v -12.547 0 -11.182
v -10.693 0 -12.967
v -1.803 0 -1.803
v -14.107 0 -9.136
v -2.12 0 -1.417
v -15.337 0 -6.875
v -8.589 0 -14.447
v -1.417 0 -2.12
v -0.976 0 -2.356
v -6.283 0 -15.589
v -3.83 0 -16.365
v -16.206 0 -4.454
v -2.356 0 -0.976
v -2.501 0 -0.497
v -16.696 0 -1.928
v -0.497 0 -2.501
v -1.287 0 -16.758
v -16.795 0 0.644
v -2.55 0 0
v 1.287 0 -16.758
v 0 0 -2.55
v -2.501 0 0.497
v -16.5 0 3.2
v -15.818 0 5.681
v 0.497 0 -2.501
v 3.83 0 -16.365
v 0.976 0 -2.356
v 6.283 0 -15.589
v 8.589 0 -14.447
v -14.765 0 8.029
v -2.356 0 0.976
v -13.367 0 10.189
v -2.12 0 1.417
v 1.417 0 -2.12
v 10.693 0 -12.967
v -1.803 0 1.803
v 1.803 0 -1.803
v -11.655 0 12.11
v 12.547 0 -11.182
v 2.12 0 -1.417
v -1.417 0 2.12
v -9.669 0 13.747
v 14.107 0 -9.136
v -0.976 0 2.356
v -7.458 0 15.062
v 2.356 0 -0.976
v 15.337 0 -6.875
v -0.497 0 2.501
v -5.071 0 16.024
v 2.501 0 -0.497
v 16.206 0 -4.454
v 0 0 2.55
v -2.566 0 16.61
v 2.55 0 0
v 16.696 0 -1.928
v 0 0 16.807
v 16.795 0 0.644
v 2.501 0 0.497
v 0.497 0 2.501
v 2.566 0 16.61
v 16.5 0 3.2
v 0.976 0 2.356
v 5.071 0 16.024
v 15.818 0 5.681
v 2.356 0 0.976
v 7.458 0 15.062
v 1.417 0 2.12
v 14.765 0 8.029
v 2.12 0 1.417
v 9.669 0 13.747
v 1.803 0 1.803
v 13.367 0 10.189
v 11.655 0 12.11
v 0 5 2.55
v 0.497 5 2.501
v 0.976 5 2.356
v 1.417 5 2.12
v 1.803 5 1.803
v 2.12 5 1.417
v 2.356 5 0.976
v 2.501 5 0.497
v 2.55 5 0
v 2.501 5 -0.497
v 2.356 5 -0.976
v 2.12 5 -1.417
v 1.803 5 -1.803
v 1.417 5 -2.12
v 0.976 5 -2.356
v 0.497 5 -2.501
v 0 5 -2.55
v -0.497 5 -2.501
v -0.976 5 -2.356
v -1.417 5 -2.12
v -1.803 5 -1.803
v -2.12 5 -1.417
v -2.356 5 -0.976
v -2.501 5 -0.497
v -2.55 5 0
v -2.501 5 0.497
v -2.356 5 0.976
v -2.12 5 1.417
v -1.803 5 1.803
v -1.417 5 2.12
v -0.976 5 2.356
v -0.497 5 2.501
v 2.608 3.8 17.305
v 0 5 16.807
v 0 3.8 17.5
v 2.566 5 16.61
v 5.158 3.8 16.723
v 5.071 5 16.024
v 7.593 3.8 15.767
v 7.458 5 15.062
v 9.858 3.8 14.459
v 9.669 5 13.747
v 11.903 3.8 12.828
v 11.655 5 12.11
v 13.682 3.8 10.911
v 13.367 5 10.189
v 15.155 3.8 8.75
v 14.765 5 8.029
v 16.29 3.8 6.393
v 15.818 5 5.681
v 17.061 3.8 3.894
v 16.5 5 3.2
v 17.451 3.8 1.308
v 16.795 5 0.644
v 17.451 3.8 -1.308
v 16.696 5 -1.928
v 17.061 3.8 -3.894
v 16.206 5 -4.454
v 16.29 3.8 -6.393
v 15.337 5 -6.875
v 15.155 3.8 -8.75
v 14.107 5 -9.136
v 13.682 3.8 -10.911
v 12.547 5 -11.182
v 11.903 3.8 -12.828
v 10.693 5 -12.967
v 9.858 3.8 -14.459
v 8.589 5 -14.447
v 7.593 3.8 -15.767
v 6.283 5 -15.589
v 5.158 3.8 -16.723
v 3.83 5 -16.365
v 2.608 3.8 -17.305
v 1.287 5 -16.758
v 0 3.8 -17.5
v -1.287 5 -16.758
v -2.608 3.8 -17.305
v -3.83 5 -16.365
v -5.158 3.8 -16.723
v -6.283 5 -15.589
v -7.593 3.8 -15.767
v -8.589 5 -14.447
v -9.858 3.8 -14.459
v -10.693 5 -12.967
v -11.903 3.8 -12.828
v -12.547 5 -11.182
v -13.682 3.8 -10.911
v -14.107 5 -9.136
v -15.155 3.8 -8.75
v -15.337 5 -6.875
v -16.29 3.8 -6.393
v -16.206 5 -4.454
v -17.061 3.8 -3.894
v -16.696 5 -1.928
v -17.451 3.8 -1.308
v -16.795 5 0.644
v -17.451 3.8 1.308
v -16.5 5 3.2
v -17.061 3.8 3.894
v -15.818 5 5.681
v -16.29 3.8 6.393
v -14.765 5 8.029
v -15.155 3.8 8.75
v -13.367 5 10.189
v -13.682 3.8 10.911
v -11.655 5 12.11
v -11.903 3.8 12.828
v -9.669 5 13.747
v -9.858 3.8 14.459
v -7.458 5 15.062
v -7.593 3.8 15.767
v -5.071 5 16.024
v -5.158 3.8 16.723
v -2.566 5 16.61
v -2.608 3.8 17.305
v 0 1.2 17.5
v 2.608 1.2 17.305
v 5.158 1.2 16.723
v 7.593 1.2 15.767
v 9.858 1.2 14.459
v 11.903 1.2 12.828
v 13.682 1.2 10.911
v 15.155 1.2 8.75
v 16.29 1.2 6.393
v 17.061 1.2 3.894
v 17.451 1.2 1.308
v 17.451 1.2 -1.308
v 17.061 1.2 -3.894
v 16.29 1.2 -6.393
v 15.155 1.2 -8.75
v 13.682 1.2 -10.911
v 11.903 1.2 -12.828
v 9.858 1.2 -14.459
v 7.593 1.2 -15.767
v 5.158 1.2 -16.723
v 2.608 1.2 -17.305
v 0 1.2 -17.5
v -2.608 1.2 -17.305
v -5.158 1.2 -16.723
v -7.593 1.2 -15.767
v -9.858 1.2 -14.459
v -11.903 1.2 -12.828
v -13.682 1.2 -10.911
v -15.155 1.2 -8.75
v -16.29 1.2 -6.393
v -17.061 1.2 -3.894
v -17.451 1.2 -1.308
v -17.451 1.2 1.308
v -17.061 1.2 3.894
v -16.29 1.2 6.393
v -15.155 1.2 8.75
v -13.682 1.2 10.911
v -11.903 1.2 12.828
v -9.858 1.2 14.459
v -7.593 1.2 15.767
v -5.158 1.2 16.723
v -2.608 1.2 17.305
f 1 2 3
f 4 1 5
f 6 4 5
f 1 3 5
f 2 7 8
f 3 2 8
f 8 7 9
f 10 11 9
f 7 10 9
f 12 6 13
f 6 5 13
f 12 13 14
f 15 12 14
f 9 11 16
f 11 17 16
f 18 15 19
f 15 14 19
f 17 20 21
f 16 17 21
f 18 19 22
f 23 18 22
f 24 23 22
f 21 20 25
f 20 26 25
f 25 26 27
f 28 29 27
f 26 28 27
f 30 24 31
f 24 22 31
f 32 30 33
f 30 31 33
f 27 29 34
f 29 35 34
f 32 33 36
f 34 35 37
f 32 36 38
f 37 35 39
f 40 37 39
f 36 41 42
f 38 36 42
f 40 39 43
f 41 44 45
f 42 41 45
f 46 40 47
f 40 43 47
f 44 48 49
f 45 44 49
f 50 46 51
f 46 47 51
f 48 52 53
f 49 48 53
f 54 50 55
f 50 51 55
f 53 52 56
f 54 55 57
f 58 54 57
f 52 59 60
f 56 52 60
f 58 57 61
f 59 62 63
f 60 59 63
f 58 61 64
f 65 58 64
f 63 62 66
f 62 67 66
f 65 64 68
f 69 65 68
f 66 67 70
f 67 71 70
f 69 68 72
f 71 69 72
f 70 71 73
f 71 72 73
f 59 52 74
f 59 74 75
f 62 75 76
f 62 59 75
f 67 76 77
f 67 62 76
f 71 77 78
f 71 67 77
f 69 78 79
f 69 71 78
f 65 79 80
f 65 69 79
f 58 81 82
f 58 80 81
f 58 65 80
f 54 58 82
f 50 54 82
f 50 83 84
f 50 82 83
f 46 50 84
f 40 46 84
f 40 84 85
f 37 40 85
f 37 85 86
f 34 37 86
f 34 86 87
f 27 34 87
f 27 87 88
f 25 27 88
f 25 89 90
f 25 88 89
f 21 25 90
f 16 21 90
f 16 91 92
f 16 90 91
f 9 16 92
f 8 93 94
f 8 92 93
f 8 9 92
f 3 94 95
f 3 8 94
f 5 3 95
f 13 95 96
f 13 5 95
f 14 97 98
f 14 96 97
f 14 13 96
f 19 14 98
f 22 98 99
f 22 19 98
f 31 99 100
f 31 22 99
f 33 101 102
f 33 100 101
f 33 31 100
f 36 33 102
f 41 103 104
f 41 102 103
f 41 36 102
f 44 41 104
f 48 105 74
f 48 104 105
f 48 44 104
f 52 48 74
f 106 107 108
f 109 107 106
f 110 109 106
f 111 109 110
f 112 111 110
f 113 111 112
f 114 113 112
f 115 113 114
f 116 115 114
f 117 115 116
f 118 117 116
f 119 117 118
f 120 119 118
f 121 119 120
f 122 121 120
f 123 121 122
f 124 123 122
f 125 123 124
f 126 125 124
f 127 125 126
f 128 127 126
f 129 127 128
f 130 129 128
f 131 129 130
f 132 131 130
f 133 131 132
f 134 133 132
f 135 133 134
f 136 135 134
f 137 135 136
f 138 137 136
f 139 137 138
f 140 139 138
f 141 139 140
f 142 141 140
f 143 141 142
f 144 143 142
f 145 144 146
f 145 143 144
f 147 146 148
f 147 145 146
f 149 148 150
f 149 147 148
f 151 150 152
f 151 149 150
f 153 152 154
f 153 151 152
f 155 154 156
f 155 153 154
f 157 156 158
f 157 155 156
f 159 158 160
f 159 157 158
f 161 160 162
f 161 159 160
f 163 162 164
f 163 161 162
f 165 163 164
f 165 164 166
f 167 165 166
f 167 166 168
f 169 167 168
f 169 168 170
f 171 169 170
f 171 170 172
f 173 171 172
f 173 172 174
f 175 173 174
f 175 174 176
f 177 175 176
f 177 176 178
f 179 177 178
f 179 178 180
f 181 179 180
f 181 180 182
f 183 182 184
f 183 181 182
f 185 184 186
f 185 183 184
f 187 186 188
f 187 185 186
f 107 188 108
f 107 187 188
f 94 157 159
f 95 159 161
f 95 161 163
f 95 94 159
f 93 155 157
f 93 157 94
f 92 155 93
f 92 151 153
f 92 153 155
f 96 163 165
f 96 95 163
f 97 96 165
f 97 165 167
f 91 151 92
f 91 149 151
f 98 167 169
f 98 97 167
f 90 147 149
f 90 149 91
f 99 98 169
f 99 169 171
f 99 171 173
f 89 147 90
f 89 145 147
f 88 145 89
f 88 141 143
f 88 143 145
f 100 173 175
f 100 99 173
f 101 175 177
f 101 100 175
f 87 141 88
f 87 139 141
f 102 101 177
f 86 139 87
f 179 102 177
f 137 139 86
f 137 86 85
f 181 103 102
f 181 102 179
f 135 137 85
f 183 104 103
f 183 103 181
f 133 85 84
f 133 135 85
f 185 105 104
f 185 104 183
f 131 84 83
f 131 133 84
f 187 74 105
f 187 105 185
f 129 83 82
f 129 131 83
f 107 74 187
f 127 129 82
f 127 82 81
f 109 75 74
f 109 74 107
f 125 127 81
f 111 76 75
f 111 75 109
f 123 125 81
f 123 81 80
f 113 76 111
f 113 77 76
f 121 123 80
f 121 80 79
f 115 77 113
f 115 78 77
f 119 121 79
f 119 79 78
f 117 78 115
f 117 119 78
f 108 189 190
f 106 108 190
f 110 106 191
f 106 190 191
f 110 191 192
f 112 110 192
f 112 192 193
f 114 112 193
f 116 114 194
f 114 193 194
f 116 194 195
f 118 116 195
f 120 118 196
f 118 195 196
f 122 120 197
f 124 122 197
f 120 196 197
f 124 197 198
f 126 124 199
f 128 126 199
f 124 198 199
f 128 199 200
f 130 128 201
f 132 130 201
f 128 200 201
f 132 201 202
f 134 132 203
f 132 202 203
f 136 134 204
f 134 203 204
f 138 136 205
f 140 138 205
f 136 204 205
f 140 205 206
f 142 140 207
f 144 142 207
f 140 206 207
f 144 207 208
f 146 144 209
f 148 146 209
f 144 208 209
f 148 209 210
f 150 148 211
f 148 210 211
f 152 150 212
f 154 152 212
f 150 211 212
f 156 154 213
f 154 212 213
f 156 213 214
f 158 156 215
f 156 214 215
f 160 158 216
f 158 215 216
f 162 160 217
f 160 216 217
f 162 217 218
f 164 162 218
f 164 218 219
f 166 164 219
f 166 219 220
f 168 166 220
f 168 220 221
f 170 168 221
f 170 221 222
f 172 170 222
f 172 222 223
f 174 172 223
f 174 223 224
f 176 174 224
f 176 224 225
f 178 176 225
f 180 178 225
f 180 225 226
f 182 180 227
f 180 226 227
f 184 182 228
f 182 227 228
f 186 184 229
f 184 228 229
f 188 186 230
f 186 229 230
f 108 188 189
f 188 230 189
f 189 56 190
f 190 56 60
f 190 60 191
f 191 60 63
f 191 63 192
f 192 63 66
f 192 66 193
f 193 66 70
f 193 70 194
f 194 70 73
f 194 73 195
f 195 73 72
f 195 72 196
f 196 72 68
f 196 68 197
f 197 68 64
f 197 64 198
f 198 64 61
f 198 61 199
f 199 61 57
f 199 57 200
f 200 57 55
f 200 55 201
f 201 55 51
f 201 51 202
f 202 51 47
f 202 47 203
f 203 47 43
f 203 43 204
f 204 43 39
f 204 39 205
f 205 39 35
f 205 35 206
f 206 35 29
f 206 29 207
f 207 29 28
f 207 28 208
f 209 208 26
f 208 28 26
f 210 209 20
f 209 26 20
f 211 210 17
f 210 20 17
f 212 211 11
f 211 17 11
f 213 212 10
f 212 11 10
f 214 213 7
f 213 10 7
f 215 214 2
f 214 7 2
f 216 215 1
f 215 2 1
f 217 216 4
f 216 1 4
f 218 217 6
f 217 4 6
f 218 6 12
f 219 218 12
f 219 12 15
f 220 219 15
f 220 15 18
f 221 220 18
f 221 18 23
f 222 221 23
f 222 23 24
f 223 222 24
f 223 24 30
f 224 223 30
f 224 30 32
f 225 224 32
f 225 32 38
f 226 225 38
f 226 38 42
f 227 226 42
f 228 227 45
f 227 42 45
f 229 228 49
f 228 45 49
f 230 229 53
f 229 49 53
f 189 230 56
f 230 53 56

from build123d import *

# Parameters (mm, degrees)
SKETCH_1_R               = 17.5
EXTRUDE_1_DEPTH          = 5
CUT_EXTRUDE_1_DEPTH      = 26.248762346
CUT_EXTRUDE_1_DEPTH_BACK = 26.248762346
SKETCH_2_R               = 2.55
CHAMFER_1_SIZE           = 1.2
CHAMFER_1_SIZE2          = 0.692820323


with BuildPart() as part:
    # 스케치1 → 보스-돌출1 (new body)
    with BuildSketch(Plane(origin=(0, 0, 0), x_dir=(1, 0, 0), z_dir=(0, 1, 0))):
        with Locations(Location((0, 0, 0), (0, 0, 270))):
            Circle(SKETCH_1_R)
    extrude(amount=EXTRUDE_1_DEPTH)

    # 스케치2 → 컷-돌출1 (cut, two sides: drawn at the far end of the back side and taken through both)
    with BuildSketch(Plane(origin=(0, 5, 0), x_dir=(1, 0, 0), z_dir=(0, 1, 0)).offset(-CUT_EXTRUDE_1_DEPTH_BACK)):
        with Locations(Location((0, 0, 0), (0, 0, 270))):
            Circle(SKETCH_2_R)
    extrude(amount=CUT_EXTRUDE_1_DEPTH + CUT_EXTRUDE_1_DEPTH_BACK, mode=Mode.SUBTRACT)

    # 모따기1
    chamfer_1_edges = [part.edges().sort_by_distance(p)[0] for p in [
        (0, 0, -17.5),
        (0, 5, -17.5),
    ]]
    chamfer_1_side = [part.faces().sort_by_distance(p)[0] for p in [
        (0, 2.5, -17.5),
    ]]
    chamfer(chamfer_1_edges, length=CHAMFER_1_SIZE, length2=CHAMFER_1_SIZE2, reference=chamfer_1_side[0])


solid = part.part
